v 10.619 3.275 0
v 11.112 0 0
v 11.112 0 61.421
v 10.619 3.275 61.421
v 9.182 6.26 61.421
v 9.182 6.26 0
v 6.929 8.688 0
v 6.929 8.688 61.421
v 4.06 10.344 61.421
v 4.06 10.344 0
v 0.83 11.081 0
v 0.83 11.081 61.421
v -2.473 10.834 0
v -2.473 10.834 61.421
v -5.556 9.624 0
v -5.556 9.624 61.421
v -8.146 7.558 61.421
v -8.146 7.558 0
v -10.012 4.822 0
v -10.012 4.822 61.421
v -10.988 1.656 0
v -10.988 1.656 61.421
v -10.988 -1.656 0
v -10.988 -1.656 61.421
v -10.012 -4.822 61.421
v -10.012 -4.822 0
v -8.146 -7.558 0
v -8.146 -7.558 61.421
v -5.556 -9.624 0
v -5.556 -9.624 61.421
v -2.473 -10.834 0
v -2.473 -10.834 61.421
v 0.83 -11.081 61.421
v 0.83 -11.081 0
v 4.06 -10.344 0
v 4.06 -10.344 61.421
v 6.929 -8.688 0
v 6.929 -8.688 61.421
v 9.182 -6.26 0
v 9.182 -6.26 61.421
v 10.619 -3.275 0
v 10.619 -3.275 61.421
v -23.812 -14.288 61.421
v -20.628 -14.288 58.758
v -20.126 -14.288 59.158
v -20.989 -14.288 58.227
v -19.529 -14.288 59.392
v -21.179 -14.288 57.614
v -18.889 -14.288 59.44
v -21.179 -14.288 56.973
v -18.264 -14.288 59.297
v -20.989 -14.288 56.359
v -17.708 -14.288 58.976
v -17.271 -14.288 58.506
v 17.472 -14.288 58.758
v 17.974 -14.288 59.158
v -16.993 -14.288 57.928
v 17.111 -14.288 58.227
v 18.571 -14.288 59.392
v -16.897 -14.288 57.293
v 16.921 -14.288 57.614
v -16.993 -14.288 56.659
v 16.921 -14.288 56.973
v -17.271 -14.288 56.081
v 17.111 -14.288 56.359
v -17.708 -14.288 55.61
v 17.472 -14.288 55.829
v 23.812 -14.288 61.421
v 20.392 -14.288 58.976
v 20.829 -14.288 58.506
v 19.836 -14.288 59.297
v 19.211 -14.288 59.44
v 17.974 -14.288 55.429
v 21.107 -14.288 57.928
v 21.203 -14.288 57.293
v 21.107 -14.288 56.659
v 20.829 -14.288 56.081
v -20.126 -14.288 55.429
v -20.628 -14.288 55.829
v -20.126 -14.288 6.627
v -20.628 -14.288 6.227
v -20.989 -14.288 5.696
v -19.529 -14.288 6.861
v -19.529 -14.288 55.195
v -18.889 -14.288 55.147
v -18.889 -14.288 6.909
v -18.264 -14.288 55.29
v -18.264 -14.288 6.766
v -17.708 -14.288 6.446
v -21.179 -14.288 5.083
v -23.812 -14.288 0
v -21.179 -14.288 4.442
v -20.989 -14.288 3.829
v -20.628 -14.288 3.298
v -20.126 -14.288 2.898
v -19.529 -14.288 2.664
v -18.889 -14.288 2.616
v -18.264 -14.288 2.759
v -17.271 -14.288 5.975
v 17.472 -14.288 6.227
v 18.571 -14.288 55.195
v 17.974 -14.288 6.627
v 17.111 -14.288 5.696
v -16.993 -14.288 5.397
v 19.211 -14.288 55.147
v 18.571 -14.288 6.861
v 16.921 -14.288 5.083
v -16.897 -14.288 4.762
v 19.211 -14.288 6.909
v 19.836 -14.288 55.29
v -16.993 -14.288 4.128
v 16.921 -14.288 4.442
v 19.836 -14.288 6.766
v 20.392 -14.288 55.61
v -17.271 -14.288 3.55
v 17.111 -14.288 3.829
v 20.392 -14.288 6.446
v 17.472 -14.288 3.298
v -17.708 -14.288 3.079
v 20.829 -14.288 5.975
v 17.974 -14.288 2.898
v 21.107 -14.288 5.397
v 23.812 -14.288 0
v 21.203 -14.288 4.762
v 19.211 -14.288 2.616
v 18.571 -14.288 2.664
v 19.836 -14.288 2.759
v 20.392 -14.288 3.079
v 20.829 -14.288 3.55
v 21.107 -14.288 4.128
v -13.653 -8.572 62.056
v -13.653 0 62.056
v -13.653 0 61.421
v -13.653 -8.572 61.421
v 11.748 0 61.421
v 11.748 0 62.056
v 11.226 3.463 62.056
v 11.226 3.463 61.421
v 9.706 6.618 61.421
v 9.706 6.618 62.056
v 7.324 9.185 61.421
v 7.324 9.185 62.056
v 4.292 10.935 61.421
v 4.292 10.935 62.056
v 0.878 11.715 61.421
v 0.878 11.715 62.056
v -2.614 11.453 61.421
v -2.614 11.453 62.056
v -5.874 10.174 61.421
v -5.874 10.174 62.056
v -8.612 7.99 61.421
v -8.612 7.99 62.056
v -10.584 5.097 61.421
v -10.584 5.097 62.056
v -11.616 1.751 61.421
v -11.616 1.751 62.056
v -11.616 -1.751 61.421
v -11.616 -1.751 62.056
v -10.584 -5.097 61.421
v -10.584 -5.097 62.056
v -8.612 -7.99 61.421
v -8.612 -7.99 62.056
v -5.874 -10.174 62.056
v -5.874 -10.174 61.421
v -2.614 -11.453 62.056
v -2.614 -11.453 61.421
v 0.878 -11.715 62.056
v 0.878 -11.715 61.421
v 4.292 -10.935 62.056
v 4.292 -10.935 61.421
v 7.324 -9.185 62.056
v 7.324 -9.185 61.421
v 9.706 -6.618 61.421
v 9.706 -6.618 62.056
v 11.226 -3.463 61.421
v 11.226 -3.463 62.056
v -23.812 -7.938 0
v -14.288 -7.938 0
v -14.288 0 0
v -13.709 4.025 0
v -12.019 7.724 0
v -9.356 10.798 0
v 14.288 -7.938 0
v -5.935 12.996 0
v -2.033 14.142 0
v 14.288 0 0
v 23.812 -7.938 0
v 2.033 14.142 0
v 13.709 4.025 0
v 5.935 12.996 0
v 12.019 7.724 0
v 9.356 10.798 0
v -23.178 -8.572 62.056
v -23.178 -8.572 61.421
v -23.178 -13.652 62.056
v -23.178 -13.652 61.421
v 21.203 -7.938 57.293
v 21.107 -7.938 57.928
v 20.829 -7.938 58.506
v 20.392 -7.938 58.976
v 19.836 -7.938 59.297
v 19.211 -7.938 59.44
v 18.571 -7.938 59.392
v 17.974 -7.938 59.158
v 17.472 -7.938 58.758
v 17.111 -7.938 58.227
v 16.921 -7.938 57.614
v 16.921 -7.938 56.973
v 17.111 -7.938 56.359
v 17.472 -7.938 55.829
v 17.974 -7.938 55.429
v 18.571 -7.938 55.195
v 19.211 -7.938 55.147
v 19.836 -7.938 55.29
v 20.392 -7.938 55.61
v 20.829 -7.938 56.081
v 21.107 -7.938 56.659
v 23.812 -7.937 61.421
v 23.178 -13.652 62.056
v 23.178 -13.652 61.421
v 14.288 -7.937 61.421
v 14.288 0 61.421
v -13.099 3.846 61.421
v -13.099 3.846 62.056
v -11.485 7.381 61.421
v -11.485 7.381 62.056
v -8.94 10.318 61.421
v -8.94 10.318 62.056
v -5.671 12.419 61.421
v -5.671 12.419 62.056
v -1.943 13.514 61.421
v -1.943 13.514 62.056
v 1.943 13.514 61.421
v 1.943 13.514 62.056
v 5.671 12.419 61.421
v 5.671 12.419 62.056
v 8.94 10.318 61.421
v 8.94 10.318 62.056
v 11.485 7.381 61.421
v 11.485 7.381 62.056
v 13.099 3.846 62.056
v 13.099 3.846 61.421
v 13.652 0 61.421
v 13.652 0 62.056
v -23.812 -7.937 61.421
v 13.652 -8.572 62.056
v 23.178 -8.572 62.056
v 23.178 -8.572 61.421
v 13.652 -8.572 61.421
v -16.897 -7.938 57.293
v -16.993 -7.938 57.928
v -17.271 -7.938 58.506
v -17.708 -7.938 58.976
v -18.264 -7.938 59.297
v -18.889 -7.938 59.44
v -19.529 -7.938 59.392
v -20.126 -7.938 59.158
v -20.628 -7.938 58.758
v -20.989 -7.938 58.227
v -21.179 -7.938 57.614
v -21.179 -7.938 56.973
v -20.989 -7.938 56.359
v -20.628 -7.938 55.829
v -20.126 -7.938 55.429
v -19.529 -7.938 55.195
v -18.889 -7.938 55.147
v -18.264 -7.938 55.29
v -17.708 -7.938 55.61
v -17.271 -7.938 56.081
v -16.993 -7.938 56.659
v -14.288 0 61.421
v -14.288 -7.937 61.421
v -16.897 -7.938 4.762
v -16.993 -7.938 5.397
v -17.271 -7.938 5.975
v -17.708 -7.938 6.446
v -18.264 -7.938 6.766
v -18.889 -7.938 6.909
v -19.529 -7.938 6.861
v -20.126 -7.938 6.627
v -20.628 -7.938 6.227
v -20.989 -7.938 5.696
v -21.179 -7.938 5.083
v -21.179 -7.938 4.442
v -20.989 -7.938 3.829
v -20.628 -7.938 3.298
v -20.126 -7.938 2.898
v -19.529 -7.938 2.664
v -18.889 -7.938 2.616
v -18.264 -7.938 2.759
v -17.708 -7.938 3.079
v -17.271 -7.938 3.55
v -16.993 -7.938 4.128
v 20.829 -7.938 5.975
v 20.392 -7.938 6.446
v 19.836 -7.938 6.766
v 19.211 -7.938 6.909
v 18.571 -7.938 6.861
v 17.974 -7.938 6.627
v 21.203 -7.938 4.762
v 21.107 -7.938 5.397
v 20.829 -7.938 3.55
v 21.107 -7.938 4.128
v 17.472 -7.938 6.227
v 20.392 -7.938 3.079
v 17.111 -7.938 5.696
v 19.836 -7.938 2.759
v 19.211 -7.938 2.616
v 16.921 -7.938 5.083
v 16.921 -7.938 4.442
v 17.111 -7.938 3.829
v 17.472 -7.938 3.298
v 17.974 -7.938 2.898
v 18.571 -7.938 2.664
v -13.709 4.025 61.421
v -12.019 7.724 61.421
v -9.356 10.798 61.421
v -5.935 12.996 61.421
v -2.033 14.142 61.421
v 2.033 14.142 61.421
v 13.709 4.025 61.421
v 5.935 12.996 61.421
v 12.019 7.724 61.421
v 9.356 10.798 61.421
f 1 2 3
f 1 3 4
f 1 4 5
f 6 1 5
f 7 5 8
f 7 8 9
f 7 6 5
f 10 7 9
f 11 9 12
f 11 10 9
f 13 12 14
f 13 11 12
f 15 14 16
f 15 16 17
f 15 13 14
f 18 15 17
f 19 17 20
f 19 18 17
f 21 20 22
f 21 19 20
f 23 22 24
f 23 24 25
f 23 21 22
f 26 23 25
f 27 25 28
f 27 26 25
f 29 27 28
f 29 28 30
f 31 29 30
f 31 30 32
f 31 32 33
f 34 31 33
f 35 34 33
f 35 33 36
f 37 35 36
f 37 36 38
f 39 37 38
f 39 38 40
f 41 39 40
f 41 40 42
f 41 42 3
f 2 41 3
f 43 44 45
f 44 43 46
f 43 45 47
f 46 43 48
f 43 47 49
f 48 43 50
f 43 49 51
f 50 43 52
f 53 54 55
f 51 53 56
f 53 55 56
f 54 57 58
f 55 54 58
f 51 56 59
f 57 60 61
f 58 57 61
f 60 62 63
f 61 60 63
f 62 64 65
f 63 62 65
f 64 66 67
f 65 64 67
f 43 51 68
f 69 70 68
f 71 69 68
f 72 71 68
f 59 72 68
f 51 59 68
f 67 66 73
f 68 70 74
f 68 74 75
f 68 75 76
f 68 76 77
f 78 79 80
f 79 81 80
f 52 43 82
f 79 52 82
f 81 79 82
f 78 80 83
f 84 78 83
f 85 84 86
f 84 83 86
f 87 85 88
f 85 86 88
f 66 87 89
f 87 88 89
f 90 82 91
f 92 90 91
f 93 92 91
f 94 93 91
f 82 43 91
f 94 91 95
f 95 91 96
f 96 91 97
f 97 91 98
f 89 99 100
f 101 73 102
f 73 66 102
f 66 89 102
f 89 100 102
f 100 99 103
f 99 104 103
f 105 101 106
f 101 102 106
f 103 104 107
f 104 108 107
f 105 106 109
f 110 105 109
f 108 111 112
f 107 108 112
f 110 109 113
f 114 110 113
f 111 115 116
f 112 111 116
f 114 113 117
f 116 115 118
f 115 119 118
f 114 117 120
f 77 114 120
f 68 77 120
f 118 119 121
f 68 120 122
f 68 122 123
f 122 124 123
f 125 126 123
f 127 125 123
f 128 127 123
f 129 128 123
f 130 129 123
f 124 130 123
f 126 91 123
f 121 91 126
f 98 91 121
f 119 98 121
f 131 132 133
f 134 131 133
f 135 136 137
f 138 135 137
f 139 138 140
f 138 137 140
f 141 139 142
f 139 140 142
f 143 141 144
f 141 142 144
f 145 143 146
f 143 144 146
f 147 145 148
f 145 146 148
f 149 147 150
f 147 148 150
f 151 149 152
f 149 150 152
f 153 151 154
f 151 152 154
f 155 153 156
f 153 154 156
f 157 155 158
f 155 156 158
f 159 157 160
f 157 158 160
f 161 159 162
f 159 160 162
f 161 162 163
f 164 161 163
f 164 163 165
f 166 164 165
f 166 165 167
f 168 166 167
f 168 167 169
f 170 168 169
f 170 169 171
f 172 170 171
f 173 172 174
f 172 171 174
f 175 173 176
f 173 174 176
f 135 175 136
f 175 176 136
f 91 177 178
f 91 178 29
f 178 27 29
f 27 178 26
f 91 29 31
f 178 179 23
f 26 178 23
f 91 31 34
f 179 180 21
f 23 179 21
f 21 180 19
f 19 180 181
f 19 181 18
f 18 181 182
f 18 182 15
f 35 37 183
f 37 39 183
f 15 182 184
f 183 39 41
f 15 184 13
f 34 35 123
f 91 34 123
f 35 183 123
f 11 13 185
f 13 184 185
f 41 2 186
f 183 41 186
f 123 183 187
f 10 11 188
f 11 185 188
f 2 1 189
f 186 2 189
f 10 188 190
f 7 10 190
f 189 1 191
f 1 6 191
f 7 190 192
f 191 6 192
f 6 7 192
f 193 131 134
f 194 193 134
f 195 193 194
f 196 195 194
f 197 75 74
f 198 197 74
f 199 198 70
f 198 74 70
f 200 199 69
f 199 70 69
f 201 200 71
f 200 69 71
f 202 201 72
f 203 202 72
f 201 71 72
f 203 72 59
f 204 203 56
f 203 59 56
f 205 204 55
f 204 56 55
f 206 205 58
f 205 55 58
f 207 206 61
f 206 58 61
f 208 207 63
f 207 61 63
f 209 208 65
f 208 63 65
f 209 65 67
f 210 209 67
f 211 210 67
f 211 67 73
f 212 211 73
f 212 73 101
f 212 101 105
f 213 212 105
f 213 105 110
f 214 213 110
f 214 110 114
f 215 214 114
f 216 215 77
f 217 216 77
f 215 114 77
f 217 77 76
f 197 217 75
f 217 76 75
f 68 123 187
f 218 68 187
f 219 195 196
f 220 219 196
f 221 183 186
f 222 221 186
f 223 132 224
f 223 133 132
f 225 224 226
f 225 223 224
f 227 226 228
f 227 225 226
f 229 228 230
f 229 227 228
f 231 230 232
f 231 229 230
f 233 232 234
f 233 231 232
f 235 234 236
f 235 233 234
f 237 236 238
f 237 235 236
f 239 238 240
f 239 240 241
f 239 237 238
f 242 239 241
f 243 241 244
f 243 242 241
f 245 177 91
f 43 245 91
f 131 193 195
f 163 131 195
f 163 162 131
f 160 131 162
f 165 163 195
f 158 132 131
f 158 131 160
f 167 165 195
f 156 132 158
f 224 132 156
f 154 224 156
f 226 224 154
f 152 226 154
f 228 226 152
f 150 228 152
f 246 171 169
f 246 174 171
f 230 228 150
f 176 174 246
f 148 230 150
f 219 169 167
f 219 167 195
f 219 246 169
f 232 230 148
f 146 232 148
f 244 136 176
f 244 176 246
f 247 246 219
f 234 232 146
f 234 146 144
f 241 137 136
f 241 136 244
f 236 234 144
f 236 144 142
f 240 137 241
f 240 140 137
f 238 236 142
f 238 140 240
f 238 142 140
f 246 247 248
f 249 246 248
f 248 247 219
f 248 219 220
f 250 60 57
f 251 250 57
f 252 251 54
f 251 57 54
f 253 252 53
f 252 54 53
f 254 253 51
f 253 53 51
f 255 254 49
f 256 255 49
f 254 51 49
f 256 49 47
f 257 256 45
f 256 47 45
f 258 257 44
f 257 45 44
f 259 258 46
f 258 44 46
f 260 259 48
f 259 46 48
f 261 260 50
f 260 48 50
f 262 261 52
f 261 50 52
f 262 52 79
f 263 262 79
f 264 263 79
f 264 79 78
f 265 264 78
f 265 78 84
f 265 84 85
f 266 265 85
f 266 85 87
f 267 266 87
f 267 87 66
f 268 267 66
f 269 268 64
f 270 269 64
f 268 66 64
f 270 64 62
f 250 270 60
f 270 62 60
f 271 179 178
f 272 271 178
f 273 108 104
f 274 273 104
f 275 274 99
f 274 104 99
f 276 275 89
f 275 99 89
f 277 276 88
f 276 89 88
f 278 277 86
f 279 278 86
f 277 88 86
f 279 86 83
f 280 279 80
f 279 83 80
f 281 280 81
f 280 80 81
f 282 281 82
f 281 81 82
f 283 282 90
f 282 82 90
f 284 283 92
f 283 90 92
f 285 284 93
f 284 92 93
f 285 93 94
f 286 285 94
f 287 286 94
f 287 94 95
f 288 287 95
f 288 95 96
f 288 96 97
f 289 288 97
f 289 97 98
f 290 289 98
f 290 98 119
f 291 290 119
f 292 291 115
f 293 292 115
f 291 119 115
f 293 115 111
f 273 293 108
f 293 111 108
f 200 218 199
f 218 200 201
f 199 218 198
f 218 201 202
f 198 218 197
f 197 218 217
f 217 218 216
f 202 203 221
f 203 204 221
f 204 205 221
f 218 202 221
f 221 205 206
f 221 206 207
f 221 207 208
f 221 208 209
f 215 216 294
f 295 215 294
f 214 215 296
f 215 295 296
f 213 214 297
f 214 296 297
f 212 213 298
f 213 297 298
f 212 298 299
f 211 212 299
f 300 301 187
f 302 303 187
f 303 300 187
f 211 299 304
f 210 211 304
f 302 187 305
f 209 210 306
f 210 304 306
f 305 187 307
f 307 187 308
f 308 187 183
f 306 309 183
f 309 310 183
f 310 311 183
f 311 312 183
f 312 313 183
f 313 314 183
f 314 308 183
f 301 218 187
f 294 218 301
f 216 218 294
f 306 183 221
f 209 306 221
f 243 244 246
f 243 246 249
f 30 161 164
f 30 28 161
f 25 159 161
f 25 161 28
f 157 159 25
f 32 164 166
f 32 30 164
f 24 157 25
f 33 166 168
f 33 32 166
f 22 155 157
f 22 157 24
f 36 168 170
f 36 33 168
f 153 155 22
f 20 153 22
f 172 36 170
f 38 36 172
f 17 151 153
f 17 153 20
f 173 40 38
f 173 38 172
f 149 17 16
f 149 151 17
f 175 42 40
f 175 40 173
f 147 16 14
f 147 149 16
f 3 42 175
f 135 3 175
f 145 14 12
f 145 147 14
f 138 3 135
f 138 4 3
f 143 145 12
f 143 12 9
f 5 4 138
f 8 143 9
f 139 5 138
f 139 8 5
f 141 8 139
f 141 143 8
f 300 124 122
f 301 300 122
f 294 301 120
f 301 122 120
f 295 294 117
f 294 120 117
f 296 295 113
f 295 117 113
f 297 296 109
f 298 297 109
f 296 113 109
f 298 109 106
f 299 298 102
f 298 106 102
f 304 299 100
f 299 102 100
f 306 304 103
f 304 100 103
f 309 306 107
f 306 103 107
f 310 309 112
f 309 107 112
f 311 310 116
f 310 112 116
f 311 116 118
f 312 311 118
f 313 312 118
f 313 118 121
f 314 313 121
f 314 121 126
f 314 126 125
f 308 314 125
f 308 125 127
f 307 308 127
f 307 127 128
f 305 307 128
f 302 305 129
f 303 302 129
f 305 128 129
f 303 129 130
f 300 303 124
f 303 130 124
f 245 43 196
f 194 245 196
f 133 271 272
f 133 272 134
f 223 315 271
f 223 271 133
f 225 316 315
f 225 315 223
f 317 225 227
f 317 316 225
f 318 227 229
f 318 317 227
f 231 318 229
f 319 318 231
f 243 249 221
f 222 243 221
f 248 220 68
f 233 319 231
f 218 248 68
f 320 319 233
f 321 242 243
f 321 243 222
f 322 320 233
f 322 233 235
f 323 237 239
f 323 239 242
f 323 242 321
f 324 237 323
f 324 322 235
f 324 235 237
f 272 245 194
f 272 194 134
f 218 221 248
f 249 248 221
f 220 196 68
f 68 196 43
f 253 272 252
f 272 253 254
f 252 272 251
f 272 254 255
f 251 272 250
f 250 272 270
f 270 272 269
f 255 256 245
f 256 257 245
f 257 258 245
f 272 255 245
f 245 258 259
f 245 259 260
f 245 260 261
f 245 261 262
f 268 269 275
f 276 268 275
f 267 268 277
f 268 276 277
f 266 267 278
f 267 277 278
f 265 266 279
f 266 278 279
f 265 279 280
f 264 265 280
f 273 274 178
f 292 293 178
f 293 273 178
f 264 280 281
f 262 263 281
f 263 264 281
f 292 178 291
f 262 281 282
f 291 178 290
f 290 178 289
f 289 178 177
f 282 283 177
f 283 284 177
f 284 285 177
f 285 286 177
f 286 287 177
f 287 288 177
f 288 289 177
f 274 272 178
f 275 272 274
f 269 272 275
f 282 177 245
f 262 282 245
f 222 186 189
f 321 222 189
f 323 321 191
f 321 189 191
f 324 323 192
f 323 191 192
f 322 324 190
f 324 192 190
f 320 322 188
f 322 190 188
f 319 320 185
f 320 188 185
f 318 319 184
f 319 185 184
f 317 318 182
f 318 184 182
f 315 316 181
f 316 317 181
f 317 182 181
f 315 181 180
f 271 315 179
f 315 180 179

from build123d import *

# Parameters (mm, degrees)
F0_R     = 11.1125
F1_DEPTH = 62.0559846
F2_R     = 2.15265
F3_DEPTH = 6.35
F4_W     = 0.635
F4_H     = 0.635
F6_R     = 11.7475
F6_R_2   = 11.1125
F7_DEPTH = 0.635


# Not quite as in the source:
# - an extrude ends at something that could not be found from the text; its depth is read off the source's solid


with BuildPart() as f1:
    # F0 (on Top) → F1 (new body)
    with BuildSketch(Plane.XY):
        with BuildLine():
            ThreePointArc((14.2875, 0), (0, 14.2875), (-14.2875, 0))
            Line((-14.2875, 0), (-14.2875, -7.9375))
            Line((-14.2875, -7.9375), (-23.8125, -7.9375))
            Line((-23.8125, -7.9375), (-23.8125, -14.2875))
            Line((-23.8125, -14.2875), (23.8125, -14.2875))
            Line((23.8125, -14.2875), (23.8125, -7.9375))
            Line((23.8125, -7.9375), (14.2875, -7.9375))
            Line((14.2875, -7.9375), (14.2875, 0))
        make_face()
        Circle(F0_R, mode=Mode.SUBTRACT)
    extrude(amount=F1_DEPTH)

    # F2 (on face) → F3 (cut, through all)
    with BuildSketch(Plane.XZ.offset(14.2875)):
        with Locations((-19.05, 4.7625)):
            Circle(F2_R)
        with Locations((-19.05, 57.2934846)):
            Circle(F2_R)
        with Locations((19.05, 57.2934846)):
            Circle(F2_R)
        with Locations((19.05, 4.7625)):
            Circle(F2_R)
    extrude(amount=-F3_DEPTH, mode=Mode.SUBTRACT)

    # F5: sweep along a path in F5_path
    with BuildLine(Plane(origin=(23.8125, -14.2875, 62.0559846), x_dir=(0, -1, 0), z_dir=(0, 0, -1))) as f5_path:
        Line((0, 0), (0, 47.625))
        Line((0, 47.625), (-6.35, 47.625))
        Line((-6.35, 47.625), (-6.35, 38.1))
        Line((-6.35, 38.1), (-14.2875, 38.1))
        ThreePointArc((-14.2875, 38.1), (-28.575, 23.8125), (-14.2875, 9.525))
        Line((-14.2875, 9.525), (-6.35, 9.525))
        Line((-6.35, 9.525), (-6.35, 0))
        Line((-6.35, 0), (0, 0))
    # F4 (on face) → F5 (sweep, cut)
    with BuildSketch(Plane(origin=(-23.8125, 0, 0), x_dir=(0, -1, 0), z_dir=(-1, 0, 0))):
        with Locations((13.97, 61.7384846)):
            Rectangle(F4_W, F4_H)
    sweep(path=f5_path.line, transition=Transition.RIGHT, mode=Mode.SUBTRACT)

    # F6 (on face) → F7 (cut, through all)
    with BuildSketch(Plane.XY.offset(62.0559846)):
        Circle(F6_R)
        Circle(F6_R_2, mode=Mode.SUBTRACT)
    extrude(amount=-F7_DEPTH, mode=Mode.SUBTRACT)


solid = f1.part
